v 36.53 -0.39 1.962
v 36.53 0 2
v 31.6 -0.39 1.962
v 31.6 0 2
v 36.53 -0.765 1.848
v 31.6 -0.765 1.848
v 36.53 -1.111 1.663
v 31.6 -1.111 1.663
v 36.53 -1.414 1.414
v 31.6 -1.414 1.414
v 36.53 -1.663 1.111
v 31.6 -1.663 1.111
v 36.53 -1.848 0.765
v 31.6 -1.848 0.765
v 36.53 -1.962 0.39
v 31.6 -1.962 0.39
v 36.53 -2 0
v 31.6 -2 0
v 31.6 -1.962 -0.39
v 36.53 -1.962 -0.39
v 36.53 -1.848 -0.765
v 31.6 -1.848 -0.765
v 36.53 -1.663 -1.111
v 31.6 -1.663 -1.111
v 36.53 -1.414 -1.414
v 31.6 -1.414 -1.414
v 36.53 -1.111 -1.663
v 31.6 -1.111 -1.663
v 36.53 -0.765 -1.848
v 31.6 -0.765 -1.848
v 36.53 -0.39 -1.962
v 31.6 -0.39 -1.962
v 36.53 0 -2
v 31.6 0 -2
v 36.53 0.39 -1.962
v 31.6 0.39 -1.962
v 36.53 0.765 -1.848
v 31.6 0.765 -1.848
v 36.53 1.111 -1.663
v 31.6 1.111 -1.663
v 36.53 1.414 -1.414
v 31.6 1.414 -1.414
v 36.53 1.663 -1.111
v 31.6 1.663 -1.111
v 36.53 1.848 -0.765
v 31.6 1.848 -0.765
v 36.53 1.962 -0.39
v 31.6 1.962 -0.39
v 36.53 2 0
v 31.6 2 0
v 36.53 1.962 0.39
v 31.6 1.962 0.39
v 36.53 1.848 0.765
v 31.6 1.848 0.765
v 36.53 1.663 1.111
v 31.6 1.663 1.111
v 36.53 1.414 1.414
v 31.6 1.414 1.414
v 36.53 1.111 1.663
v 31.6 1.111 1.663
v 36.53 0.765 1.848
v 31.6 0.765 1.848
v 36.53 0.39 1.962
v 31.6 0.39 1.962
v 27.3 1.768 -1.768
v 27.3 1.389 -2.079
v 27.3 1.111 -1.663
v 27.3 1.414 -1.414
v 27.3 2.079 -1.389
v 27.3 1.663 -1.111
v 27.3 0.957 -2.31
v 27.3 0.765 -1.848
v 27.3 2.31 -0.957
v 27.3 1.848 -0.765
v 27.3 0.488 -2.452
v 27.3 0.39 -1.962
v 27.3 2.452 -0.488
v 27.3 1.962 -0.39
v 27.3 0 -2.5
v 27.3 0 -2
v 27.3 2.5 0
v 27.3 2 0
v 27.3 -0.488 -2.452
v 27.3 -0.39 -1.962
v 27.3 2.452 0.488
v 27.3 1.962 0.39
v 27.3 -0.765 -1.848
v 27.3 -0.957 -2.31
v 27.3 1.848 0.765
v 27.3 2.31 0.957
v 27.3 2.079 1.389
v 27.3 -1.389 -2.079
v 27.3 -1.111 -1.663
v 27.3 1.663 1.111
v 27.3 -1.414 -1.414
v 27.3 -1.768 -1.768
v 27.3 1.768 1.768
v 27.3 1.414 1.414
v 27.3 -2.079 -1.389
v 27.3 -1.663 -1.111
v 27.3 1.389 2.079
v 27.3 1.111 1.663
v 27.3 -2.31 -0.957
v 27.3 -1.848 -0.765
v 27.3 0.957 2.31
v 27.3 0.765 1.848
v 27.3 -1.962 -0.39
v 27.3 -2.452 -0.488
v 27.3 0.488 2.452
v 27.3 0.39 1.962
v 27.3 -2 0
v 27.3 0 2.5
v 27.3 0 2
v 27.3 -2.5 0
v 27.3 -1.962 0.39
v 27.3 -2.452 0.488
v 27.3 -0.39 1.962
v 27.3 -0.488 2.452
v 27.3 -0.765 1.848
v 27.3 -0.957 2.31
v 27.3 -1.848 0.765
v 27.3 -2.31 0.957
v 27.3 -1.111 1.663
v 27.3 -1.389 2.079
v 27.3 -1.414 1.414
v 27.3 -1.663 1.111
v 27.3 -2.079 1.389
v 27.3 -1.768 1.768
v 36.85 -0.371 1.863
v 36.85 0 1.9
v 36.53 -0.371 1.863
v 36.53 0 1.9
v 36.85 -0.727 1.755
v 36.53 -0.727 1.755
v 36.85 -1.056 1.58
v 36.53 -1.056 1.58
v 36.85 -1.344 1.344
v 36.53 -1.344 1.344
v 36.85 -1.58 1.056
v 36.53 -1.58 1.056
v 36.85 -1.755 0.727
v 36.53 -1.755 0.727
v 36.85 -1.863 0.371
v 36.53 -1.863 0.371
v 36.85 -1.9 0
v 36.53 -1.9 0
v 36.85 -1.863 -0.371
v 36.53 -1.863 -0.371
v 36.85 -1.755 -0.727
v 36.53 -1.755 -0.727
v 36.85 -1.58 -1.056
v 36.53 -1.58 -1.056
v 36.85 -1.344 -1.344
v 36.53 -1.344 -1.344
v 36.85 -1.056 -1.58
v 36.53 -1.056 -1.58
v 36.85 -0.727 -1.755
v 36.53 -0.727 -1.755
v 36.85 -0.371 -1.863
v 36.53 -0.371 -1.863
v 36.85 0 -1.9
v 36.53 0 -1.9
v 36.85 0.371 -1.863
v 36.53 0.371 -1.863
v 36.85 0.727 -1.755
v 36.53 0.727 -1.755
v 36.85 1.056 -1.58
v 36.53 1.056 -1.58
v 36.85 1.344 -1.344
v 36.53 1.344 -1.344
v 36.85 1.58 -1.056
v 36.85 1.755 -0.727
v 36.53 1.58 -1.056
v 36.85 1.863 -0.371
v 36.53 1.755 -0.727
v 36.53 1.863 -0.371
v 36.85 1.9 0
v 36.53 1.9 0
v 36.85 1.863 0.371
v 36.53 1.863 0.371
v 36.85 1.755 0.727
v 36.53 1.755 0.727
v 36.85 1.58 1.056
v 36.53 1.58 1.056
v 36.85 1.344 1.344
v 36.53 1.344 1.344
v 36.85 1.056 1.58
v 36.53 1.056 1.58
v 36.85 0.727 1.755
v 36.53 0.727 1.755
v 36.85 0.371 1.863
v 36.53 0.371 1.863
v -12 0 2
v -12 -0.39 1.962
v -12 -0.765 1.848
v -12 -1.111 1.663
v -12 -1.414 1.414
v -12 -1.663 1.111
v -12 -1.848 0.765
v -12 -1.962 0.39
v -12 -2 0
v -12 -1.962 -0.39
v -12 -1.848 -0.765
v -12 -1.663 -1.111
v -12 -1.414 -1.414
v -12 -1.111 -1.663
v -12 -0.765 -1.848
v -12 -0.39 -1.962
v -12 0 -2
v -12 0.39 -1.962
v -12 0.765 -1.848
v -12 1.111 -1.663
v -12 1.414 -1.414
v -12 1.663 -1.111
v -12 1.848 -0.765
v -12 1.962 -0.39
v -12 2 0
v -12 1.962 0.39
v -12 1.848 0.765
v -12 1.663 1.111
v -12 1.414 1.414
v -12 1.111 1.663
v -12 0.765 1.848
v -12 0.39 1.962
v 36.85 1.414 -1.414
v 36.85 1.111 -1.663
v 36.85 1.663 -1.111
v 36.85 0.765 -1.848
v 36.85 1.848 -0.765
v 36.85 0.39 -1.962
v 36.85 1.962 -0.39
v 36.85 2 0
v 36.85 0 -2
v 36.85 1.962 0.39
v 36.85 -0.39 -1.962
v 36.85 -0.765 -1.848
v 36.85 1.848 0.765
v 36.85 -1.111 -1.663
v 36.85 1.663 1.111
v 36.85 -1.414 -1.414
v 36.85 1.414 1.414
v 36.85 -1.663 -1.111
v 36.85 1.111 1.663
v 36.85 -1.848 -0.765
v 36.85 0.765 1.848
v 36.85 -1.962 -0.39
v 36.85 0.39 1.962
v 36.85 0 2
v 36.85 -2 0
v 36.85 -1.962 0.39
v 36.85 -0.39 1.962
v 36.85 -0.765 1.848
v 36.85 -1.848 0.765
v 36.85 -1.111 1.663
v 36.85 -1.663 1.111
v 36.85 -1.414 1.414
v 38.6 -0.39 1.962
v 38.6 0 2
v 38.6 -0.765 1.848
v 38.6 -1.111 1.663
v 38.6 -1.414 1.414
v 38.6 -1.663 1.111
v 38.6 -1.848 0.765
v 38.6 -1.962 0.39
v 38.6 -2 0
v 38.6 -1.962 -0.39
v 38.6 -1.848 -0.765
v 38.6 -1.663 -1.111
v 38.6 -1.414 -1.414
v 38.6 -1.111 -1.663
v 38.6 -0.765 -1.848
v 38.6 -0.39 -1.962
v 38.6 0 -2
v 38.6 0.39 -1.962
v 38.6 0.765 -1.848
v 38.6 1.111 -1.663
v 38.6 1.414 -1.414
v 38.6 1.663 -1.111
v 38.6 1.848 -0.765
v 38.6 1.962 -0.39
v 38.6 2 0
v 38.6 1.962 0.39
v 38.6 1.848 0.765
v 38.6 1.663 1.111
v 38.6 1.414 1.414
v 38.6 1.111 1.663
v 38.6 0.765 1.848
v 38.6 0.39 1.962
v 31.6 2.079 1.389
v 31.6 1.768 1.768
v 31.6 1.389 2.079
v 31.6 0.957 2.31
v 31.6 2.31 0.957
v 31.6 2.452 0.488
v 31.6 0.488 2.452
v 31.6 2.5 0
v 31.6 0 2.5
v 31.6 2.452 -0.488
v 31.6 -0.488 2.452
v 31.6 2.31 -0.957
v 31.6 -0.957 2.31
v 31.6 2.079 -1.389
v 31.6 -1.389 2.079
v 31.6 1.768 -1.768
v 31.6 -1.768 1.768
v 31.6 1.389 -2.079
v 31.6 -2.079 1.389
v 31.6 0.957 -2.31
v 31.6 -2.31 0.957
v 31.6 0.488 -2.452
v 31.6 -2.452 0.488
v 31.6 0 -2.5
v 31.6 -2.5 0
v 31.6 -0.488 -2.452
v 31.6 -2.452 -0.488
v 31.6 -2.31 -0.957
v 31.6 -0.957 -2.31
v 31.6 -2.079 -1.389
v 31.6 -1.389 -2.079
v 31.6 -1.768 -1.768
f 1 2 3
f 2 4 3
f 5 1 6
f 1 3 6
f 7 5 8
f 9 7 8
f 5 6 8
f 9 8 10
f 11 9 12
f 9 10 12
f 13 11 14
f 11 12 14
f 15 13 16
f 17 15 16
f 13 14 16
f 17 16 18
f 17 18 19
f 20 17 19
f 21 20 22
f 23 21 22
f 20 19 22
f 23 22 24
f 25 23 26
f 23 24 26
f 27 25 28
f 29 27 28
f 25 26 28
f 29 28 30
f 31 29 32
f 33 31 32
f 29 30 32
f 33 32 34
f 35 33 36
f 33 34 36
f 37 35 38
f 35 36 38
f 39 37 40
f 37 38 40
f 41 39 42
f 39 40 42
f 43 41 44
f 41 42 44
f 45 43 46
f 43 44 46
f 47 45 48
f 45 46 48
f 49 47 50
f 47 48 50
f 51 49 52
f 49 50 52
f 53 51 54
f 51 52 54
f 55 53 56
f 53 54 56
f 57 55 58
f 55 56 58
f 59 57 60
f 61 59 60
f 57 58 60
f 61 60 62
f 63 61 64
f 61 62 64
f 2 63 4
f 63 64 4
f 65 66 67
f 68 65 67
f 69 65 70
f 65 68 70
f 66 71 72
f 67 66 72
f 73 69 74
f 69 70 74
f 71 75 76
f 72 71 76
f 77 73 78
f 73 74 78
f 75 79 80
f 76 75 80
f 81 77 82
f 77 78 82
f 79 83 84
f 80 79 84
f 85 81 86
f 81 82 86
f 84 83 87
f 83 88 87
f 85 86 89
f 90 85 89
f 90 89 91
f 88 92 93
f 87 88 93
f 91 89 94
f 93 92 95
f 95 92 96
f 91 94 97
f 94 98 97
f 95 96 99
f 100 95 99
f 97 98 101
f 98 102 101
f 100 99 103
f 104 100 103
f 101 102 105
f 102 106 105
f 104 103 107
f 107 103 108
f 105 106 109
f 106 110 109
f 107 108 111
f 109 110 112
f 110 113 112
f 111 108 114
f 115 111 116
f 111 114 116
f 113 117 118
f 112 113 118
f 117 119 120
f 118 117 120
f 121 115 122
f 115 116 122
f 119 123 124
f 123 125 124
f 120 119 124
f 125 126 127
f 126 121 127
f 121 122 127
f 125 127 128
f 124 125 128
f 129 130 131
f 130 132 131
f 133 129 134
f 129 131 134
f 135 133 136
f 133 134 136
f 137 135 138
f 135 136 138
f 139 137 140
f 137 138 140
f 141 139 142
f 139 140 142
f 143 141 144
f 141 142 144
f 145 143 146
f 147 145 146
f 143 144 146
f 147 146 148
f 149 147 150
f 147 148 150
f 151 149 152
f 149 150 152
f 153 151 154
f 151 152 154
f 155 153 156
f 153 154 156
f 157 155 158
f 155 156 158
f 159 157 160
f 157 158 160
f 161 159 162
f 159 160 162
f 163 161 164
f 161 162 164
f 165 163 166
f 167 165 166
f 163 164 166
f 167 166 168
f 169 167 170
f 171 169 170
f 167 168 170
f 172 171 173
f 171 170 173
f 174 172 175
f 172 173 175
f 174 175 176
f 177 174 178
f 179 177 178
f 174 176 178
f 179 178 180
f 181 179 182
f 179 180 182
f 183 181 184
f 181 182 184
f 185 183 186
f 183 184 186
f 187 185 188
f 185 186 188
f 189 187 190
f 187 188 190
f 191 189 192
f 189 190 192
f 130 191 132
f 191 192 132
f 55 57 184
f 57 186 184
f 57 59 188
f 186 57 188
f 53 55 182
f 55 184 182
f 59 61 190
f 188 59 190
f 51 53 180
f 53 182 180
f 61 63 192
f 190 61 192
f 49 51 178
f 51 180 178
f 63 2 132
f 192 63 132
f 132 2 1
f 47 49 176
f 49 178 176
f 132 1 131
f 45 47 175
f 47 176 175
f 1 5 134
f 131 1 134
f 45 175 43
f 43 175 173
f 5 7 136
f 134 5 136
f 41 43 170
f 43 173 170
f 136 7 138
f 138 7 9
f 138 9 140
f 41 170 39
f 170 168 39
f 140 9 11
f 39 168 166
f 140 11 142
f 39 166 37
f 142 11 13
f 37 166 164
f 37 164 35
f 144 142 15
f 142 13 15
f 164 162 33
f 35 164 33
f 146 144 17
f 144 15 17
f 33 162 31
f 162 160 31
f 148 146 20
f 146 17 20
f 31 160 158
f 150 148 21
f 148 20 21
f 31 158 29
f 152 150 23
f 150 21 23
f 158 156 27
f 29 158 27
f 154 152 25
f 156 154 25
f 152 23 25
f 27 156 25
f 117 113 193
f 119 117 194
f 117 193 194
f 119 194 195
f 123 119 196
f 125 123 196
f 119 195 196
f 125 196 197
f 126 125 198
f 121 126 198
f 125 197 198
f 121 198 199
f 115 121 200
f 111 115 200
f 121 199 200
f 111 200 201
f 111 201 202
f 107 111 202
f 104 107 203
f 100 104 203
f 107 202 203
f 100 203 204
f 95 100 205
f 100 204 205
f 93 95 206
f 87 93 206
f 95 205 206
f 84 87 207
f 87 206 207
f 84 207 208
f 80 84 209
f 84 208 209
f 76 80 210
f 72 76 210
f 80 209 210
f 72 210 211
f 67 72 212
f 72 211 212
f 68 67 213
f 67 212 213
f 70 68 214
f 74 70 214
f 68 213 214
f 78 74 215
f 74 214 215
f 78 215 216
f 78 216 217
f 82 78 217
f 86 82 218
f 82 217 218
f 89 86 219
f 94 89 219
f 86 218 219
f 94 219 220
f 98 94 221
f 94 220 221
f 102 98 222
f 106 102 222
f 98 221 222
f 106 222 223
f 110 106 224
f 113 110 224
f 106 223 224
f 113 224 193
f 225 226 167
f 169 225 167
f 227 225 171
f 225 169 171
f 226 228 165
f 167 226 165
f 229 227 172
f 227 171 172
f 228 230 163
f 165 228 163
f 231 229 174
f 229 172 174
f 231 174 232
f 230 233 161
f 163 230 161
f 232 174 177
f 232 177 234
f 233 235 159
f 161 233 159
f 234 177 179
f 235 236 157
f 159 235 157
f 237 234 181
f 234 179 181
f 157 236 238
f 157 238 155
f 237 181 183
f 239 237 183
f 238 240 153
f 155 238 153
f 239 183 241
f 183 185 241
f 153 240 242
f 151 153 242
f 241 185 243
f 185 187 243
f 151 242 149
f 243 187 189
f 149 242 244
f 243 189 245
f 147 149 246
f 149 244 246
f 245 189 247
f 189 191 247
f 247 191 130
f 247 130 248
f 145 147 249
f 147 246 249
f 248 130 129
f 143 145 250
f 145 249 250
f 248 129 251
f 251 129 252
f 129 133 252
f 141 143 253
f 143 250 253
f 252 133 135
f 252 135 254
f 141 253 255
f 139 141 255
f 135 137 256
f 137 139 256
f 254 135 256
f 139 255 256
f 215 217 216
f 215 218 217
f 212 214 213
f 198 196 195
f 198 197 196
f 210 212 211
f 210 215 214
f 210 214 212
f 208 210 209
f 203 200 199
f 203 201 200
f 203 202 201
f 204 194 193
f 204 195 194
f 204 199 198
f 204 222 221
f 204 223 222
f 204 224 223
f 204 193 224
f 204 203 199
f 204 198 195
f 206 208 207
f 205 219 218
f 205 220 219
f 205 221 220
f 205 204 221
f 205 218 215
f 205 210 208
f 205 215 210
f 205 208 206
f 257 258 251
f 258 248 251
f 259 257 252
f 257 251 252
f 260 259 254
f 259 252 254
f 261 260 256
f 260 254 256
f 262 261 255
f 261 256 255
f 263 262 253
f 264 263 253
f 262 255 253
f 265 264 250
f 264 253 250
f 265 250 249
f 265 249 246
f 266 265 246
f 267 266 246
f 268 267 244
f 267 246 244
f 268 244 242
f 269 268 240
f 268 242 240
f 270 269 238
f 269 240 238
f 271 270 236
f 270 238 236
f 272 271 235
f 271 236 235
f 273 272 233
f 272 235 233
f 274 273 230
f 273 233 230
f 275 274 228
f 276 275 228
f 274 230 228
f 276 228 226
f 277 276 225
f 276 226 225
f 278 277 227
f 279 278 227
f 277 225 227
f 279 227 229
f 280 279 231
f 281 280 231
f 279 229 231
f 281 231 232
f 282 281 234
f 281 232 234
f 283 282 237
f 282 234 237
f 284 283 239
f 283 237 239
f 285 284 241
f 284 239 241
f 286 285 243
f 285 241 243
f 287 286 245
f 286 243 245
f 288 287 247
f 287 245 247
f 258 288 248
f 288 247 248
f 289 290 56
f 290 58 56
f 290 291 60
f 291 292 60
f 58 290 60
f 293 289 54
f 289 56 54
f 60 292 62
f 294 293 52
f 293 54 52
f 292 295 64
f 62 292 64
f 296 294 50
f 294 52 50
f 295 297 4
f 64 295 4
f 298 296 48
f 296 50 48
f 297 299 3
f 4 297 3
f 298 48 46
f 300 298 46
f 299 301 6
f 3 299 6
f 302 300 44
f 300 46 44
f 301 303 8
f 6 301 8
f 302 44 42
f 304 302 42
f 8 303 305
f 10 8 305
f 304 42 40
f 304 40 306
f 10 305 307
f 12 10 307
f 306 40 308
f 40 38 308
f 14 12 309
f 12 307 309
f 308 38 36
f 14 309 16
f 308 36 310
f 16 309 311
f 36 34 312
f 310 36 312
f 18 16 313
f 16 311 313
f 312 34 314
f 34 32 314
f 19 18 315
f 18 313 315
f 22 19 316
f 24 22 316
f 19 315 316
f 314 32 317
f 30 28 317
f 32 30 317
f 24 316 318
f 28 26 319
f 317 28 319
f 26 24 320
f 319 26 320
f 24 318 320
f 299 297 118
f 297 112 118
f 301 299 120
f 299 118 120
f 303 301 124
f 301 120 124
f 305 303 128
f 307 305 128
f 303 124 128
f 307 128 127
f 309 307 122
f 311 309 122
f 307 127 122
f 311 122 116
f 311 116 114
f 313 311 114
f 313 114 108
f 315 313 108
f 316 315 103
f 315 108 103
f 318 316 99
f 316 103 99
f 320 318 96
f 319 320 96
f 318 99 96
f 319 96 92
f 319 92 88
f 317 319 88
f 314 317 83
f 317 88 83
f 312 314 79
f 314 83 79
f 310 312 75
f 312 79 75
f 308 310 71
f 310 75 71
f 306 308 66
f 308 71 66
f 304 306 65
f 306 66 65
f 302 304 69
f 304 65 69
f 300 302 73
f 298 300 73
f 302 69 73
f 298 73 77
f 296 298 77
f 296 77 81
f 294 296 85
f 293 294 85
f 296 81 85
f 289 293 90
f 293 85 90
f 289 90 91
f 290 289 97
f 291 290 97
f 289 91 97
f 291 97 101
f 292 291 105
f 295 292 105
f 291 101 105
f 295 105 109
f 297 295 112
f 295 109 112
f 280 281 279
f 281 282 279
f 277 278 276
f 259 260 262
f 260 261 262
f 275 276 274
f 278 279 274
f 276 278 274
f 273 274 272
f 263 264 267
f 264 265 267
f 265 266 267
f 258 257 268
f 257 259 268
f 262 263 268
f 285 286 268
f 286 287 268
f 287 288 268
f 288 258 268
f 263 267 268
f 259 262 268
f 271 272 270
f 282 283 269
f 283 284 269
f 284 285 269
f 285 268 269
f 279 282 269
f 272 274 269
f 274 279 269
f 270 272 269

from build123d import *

# Parameters (mm, degrees)
SKETCH1_W = 12
SKETCH1_H = 2


with BuildPart() as part:
    # Sketch1 → Revolve1 (revolve)
    with BuildSketch(Plane.XY, mode=Mode.PRIVATE) as revolve1_sk:
        Polygon((27.3, 2.5), (27.3, 2), (0, 2), (0, 0), (38.6, 0), (38.6, 2), (36.85, 2), (36.85, 1.9), (36.53, 1.9), (36.53, 2), (31.6, 2), (31.6, 2.5), align=None)
        with Locations((-6, 1)):
            Rectangle(SKETCH1_W, SKETCH1_H)
    revolve(revolve1_sk.sketch.rotate(Axis((0, 0, 0), (1, 0, 0)), 90), axis=Axis((0, 0, 0), (1, 0, 0)))


solid = part.part
